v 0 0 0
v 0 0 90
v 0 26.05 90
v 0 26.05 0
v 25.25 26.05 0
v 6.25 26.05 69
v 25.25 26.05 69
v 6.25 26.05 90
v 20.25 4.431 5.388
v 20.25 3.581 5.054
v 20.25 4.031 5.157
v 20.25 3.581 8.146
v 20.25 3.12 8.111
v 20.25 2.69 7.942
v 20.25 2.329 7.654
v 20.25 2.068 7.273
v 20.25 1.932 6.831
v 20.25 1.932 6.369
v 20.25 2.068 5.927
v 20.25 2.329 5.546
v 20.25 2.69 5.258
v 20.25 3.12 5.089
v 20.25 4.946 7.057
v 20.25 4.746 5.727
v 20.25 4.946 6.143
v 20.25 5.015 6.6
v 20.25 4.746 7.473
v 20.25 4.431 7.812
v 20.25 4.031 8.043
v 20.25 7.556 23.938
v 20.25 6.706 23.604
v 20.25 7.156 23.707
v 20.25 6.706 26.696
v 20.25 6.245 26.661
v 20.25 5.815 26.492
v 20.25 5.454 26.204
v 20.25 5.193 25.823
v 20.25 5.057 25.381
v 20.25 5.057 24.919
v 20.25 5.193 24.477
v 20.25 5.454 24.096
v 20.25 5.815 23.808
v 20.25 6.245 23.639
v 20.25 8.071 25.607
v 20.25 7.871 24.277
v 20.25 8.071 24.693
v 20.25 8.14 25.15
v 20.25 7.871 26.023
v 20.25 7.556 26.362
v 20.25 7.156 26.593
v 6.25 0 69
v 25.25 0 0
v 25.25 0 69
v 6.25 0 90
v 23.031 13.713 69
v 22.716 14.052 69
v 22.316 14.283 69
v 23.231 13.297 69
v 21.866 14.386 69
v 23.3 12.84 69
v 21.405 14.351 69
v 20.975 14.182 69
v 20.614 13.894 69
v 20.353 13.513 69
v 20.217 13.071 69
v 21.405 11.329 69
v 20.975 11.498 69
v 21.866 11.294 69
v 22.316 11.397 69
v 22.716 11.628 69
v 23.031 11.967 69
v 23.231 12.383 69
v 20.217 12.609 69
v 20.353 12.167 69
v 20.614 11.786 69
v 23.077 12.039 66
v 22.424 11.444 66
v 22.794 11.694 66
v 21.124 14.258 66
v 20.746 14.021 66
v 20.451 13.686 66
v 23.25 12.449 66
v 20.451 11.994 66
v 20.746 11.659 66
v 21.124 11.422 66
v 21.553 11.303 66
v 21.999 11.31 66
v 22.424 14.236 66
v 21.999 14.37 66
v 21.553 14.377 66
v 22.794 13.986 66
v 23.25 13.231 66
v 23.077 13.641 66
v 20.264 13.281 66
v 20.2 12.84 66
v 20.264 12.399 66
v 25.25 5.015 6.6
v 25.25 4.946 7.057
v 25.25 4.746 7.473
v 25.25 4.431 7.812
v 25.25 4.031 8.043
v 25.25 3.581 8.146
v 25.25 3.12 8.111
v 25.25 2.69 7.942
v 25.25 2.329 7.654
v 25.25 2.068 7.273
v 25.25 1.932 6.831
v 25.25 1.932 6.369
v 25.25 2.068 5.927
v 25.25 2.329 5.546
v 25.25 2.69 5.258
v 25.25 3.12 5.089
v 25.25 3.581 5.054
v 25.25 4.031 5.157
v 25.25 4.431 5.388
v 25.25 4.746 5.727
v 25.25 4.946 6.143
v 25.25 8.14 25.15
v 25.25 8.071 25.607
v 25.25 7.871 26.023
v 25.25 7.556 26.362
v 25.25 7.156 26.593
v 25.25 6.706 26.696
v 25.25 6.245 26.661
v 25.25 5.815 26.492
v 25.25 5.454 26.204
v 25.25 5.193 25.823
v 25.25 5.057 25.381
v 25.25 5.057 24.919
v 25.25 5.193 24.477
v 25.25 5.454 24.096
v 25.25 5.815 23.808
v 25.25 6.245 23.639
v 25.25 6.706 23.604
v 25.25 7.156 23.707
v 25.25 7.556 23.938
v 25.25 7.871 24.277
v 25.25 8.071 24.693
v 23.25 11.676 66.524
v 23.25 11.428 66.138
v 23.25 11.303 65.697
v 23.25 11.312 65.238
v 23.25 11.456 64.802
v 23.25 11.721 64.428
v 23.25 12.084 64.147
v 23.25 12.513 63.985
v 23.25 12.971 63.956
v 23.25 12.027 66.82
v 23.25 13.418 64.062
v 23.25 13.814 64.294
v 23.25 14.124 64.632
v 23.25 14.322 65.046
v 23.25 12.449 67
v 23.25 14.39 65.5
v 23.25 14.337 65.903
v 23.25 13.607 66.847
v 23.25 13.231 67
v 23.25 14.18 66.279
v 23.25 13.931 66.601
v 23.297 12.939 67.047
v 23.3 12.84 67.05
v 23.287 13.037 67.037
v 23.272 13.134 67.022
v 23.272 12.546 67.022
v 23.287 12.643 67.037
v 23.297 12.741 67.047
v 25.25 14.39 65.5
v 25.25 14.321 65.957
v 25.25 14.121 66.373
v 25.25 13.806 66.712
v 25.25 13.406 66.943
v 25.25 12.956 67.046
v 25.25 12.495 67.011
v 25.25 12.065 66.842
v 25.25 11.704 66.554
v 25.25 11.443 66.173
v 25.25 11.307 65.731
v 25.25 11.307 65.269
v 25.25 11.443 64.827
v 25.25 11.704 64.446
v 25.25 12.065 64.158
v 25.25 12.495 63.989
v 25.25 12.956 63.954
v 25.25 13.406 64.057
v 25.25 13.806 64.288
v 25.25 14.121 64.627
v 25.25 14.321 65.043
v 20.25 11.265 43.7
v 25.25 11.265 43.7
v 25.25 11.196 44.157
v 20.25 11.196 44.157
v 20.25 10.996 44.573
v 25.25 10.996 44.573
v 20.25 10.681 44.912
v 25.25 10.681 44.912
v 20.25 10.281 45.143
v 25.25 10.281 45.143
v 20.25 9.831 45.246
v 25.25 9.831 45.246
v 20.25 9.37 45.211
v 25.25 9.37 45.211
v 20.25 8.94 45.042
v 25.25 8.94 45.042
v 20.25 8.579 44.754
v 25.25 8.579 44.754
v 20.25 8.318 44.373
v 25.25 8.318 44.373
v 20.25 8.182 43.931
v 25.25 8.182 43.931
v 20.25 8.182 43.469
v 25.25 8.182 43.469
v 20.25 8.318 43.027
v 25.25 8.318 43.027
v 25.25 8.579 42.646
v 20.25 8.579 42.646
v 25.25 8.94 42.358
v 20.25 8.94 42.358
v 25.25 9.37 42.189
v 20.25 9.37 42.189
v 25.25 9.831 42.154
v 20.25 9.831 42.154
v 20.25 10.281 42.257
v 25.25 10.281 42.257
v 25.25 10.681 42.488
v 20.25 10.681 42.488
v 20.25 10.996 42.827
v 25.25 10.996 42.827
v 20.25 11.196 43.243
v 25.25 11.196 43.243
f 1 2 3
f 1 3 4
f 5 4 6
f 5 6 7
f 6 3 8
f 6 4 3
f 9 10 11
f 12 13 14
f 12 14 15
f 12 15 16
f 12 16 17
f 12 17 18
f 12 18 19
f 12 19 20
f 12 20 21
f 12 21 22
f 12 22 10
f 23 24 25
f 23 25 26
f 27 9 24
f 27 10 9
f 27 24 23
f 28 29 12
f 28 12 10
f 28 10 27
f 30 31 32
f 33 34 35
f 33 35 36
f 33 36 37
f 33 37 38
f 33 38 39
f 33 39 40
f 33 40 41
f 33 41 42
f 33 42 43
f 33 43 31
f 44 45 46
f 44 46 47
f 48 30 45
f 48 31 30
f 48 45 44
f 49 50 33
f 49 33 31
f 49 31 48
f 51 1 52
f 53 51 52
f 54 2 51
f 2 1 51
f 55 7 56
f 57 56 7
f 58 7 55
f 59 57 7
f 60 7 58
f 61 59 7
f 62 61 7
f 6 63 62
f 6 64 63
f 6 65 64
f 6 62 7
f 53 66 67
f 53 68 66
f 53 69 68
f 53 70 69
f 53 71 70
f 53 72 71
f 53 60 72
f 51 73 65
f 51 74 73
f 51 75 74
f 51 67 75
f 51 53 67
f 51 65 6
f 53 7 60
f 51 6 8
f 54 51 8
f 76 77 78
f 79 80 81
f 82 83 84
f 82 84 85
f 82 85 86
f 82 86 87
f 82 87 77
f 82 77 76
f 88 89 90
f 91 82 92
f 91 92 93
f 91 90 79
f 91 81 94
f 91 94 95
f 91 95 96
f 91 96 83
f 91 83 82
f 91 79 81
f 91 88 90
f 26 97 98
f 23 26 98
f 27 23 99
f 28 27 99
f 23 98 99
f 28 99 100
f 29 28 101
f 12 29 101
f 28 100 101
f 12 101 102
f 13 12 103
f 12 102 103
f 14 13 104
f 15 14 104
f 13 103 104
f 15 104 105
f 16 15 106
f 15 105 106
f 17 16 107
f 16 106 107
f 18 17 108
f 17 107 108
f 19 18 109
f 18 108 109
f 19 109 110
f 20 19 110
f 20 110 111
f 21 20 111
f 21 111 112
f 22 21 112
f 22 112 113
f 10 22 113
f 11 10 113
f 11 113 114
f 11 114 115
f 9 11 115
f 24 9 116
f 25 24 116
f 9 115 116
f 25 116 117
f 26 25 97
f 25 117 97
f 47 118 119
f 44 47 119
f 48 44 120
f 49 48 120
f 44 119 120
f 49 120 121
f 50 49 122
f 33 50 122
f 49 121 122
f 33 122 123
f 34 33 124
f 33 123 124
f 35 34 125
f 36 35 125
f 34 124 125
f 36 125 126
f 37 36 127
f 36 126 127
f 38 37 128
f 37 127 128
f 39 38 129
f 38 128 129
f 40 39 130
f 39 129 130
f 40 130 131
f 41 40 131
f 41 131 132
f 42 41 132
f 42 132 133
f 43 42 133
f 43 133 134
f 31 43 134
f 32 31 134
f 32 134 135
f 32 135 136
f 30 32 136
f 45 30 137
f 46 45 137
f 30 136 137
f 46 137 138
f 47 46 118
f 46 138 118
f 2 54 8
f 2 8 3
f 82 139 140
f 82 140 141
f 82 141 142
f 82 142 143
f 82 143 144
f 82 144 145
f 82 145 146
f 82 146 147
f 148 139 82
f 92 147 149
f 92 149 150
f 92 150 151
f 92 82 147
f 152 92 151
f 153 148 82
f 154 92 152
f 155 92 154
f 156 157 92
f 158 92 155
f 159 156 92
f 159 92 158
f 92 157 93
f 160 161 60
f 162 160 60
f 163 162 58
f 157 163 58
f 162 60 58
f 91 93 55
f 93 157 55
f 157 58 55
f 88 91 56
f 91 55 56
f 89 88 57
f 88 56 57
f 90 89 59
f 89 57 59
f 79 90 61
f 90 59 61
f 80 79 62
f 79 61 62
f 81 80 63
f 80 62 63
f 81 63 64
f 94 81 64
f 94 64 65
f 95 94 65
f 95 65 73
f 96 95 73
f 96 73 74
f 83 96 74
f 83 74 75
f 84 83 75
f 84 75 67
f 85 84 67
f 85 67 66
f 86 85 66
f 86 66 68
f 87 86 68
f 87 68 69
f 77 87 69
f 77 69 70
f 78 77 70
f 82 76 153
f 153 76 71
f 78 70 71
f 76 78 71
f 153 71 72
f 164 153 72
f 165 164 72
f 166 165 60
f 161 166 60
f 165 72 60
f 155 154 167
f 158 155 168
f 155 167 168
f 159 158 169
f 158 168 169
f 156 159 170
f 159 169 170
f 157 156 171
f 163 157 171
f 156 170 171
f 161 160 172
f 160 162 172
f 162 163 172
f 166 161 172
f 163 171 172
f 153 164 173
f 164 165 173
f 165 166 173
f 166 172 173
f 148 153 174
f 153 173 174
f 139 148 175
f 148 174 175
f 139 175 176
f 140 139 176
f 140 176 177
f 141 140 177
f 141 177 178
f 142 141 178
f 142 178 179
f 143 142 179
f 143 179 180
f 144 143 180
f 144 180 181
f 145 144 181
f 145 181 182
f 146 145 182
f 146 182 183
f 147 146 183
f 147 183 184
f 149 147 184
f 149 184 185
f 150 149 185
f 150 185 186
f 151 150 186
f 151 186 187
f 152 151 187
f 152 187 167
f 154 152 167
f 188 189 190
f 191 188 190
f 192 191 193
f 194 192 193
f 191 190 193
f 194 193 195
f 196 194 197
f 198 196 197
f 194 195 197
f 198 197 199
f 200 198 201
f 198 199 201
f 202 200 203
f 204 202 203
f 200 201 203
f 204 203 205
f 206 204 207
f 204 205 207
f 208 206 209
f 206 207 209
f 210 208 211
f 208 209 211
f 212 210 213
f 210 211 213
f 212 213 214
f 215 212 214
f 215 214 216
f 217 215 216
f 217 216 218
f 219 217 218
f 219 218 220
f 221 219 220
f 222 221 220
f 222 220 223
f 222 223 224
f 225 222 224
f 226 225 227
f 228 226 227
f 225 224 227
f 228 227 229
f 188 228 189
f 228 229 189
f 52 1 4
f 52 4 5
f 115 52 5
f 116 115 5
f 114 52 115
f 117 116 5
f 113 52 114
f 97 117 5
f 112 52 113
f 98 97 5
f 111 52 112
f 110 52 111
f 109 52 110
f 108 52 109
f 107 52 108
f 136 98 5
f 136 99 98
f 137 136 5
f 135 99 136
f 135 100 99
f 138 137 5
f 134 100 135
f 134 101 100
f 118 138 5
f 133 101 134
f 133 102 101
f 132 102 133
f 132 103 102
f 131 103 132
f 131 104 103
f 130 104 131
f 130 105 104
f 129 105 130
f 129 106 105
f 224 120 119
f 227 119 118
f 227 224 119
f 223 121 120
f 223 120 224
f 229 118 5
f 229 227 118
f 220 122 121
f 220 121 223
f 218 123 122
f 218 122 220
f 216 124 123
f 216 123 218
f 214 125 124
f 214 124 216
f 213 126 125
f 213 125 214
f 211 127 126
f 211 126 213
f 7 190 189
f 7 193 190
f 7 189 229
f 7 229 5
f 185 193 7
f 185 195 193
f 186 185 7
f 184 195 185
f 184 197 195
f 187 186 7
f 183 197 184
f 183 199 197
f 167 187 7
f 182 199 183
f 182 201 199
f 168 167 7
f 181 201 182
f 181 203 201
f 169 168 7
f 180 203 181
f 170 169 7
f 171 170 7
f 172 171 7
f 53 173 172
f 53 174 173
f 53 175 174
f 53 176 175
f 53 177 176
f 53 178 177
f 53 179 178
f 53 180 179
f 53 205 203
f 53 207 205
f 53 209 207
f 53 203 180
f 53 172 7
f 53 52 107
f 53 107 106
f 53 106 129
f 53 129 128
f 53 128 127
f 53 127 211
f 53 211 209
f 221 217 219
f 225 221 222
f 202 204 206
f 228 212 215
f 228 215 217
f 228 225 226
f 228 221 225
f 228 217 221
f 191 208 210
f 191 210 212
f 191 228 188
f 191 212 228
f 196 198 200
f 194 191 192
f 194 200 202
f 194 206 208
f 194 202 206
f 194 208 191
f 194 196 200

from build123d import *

# Parameters (mm, degrees)
F1_DEPTH = 26.05
F2_R     = 1.55
F3_DEPTH = 5
F4_R     = 1.55
F5_DEPTH = 3
F6_DEPTH = 2


with BuildPart() as f1:
    # F0 (on Front) → F1 (new body)
    with BuildSketch(Plane.XZ):
        Polygon((0, 90), (0, 0), (25.25, 0), (25.25, 69), (6.25, 69), (6.25, 90), align=None)
    extrude(amount=-F1_DEPTH)

    # F2 (on face) → F3 (cut)
    with BuildSketch(Plane.YZ.offset(25.25)):
        with Locations((9.715, 43.7)):
            Circle(F2_R)
        with Locations((6.59, 25.15)):
            Circle(F2_R)
        with Locations((3.465, 6.6)):
            Circle(F2_R)
    extrude(amount=-F3_DEPTH, mode=Mode.SUBTRACT)

    # F4 (on face) → F5 (cut)
    with BuildSketch(Plane.XY.offset(69)):
        with Locations((21.75, 12.84)):
            Circle(F4_R)
    extrude(amount=-F5_DEPTH, mode=Mode.SUBTRACT)

    # F2 (on face) → F6 (cut)
    with BuildSketch(Plane.YZ.offset(25.25)):
        with Locations((12.84, 65.5)):
            Circle(F2_R)
    extrude(amount=-F6_DEPTH, mode=Mode.SUBTRACT)


solid = f1.part
